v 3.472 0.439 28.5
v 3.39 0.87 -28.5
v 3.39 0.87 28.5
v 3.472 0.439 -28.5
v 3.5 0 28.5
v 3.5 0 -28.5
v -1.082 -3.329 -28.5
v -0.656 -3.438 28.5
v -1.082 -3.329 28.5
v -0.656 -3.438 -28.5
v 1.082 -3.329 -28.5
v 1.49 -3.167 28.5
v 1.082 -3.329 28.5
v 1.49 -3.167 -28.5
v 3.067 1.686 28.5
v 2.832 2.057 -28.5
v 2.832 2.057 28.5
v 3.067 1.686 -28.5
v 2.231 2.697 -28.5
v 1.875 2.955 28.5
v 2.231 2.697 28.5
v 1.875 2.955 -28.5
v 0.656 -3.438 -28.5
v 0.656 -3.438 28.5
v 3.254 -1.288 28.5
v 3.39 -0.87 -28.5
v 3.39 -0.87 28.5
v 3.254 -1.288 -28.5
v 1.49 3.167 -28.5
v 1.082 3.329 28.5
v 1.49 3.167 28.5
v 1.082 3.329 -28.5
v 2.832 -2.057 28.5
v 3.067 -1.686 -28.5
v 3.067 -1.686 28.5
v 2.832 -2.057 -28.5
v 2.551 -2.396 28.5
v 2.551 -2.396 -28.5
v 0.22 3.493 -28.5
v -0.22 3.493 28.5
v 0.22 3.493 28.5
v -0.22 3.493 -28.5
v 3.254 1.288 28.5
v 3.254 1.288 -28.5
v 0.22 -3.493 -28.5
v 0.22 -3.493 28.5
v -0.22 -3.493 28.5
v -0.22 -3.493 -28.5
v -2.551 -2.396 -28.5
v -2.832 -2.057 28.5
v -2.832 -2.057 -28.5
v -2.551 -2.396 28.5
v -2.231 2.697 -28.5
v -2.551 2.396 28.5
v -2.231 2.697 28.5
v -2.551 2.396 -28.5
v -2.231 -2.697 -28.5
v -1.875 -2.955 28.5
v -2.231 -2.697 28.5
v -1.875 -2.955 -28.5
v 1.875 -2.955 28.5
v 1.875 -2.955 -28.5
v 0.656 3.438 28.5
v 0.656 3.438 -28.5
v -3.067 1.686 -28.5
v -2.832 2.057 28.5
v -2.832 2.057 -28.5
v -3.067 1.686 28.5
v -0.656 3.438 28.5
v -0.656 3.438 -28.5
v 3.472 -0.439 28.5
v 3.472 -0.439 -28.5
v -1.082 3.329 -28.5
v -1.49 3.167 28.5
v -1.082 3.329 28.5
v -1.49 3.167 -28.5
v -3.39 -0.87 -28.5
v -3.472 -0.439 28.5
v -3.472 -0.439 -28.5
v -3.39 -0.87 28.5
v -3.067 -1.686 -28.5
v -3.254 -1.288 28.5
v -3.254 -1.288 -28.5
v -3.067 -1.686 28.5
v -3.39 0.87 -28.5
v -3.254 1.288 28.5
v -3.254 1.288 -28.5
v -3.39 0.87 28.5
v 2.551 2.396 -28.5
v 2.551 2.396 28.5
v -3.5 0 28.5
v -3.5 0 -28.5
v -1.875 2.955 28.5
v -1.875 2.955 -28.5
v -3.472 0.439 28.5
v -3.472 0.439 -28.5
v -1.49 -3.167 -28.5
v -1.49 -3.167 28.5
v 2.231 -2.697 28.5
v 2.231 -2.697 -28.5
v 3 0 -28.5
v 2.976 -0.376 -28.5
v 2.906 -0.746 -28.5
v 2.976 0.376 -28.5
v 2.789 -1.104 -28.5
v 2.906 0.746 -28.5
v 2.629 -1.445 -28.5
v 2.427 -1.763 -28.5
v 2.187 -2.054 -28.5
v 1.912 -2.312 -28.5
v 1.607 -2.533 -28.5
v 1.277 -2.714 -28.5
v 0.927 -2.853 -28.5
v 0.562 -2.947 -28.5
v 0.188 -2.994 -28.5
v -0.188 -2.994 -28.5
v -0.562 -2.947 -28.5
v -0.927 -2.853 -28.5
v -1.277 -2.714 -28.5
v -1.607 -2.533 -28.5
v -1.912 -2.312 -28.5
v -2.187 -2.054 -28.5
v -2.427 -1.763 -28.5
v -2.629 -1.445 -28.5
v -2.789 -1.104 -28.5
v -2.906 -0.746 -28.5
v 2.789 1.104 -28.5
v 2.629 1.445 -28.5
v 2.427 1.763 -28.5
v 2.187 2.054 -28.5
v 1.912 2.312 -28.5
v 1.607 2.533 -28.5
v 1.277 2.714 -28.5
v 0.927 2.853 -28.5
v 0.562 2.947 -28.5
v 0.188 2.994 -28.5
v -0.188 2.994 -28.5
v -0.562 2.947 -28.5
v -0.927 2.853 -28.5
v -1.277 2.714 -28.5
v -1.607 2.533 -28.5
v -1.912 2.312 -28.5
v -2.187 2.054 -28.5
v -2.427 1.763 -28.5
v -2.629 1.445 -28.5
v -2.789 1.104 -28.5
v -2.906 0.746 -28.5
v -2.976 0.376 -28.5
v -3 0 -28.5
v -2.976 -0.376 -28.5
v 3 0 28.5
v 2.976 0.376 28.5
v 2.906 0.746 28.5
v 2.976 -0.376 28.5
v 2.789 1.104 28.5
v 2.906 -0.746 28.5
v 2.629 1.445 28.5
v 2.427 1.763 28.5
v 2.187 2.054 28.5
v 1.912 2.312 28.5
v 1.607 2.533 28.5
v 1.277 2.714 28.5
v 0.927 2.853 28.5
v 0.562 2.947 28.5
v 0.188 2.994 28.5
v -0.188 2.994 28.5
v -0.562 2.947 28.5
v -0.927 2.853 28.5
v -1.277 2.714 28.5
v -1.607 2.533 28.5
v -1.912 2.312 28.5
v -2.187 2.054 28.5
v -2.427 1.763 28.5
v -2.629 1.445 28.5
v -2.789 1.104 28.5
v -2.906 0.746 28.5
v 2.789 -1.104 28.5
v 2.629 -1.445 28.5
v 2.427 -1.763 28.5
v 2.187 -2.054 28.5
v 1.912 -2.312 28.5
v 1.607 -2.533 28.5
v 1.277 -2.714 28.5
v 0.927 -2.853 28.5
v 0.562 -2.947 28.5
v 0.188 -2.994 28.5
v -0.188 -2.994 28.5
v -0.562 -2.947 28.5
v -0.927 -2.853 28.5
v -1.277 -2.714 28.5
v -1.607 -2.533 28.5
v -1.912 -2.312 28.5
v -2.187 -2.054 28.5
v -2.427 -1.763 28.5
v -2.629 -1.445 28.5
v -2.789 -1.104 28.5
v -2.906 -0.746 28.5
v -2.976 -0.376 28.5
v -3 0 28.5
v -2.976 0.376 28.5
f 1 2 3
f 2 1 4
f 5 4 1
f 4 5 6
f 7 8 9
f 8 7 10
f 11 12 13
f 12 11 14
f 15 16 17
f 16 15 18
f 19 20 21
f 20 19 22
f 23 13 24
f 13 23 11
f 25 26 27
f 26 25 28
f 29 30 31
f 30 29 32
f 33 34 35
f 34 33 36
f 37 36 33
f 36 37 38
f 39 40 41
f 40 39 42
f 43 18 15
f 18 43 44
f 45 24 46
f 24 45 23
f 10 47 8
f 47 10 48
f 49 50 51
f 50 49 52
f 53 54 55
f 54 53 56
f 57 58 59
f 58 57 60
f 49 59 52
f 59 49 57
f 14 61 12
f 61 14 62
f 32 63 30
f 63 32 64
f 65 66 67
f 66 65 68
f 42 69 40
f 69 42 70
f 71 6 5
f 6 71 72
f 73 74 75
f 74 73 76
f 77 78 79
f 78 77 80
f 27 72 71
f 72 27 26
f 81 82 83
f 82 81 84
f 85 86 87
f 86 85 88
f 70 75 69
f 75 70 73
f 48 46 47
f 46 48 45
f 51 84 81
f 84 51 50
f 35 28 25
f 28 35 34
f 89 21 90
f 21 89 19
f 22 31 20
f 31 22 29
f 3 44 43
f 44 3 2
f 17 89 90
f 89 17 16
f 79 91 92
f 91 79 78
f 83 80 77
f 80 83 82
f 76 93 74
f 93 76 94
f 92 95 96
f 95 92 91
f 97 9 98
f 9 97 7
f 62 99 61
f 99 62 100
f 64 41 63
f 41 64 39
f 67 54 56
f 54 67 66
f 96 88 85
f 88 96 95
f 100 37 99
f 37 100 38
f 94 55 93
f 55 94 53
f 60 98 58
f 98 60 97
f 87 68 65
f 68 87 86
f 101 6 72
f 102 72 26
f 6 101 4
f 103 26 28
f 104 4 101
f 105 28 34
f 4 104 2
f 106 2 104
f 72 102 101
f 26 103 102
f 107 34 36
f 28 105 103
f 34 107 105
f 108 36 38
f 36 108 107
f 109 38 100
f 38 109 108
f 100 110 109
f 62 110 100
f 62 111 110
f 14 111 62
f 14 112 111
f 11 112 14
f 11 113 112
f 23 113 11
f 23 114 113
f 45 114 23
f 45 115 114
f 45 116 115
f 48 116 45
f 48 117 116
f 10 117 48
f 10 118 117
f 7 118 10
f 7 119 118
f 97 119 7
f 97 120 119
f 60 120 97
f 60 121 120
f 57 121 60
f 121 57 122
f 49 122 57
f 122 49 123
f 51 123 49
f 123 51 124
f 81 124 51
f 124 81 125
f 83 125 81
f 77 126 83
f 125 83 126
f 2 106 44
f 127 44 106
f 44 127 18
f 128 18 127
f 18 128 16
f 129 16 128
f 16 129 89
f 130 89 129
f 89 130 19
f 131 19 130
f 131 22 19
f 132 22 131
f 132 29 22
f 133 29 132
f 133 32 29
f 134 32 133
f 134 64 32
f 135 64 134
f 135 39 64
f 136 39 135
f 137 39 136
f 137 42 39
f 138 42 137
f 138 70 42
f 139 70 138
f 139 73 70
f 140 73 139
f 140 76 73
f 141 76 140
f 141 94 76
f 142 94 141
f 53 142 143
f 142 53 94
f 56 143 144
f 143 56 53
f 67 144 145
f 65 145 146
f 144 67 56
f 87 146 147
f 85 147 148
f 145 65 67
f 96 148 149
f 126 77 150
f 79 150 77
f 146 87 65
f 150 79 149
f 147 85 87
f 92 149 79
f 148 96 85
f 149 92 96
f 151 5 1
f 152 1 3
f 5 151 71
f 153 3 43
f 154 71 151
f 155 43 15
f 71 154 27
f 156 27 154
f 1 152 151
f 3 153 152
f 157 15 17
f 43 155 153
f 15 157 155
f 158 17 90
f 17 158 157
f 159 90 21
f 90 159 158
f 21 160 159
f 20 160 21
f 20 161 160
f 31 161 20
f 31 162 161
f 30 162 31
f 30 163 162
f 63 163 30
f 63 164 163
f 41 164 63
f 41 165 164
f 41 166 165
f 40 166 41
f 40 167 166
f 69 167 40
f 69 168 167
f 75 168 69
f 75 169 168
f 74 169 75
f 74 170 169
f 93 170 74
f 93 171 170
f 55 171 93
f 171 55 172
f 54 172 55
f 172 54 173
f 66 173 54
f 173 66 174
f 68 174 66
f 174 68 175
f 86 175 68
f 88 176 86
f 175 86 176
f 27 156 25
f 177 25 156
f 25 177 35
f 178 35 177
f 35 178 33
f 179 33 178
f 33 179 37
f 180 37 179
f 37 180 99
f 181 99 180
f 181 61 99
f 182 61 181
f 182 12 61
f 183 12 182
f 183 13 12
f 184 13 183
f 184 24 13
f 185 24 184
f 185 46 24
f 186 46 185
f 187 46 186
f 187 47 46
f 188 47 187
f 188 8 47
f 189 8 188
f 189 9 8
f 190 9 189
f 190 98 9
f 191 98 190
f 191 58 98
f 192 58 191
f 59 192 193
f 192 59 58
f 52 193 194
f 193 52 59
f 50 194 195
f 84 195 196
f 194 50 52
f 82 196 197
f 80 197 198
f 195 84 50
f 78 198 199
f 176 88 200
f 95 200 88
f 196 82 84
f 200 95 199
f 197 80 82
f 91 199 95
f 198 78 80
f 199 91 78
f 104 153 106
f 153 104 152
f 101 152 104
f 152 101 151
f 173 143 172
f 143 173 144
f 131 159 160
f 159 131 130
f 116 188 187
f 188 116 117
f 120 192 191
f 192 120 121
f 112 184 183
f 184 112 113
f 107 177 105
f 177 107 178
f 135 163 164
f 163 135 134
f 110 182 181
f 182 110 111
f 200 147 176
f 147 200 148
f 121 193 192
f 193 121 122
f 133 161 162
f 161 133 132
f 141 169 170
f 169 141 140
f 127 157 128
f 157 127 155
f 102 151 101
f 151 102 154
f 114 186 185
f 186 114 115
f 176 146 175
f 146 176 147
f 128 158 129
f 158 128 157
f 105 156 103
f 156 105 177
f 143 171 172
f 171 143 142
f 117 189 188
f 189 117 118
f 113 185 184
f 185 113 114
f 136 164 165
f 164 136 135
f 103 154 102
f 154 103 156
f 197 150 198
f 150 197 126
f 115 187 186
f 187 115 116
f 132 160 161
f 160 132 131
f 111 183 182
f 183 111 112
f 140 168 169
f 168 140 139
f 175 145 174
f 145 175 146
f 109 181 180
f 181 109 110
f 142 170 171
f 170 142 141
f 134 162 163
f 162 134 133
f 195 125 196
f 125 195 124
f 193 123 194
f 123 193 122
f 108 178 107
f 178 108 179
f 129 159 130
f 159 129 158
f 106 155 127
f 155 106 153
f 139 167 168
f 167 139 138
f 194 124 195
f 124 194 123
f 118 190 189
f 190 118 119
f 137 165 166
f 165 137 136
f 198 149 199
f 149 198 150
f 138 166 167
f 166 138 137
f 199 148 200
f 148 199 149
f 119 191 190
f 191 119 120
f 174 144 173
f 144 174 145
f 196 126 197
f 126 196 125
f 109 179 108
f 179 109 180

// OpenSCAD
$fn = 50;


difference() {
	union() {
		translate(v = [0, 0, -28.5000000000]) {
			cylinder(h = 57, r = 3.5000000000);
		}
	}
	union() {
		translate(v = [0, 0, -100.0000000000]) {
			cylinder(h = 200, r = 3.0000000000);
		}
	}
}
